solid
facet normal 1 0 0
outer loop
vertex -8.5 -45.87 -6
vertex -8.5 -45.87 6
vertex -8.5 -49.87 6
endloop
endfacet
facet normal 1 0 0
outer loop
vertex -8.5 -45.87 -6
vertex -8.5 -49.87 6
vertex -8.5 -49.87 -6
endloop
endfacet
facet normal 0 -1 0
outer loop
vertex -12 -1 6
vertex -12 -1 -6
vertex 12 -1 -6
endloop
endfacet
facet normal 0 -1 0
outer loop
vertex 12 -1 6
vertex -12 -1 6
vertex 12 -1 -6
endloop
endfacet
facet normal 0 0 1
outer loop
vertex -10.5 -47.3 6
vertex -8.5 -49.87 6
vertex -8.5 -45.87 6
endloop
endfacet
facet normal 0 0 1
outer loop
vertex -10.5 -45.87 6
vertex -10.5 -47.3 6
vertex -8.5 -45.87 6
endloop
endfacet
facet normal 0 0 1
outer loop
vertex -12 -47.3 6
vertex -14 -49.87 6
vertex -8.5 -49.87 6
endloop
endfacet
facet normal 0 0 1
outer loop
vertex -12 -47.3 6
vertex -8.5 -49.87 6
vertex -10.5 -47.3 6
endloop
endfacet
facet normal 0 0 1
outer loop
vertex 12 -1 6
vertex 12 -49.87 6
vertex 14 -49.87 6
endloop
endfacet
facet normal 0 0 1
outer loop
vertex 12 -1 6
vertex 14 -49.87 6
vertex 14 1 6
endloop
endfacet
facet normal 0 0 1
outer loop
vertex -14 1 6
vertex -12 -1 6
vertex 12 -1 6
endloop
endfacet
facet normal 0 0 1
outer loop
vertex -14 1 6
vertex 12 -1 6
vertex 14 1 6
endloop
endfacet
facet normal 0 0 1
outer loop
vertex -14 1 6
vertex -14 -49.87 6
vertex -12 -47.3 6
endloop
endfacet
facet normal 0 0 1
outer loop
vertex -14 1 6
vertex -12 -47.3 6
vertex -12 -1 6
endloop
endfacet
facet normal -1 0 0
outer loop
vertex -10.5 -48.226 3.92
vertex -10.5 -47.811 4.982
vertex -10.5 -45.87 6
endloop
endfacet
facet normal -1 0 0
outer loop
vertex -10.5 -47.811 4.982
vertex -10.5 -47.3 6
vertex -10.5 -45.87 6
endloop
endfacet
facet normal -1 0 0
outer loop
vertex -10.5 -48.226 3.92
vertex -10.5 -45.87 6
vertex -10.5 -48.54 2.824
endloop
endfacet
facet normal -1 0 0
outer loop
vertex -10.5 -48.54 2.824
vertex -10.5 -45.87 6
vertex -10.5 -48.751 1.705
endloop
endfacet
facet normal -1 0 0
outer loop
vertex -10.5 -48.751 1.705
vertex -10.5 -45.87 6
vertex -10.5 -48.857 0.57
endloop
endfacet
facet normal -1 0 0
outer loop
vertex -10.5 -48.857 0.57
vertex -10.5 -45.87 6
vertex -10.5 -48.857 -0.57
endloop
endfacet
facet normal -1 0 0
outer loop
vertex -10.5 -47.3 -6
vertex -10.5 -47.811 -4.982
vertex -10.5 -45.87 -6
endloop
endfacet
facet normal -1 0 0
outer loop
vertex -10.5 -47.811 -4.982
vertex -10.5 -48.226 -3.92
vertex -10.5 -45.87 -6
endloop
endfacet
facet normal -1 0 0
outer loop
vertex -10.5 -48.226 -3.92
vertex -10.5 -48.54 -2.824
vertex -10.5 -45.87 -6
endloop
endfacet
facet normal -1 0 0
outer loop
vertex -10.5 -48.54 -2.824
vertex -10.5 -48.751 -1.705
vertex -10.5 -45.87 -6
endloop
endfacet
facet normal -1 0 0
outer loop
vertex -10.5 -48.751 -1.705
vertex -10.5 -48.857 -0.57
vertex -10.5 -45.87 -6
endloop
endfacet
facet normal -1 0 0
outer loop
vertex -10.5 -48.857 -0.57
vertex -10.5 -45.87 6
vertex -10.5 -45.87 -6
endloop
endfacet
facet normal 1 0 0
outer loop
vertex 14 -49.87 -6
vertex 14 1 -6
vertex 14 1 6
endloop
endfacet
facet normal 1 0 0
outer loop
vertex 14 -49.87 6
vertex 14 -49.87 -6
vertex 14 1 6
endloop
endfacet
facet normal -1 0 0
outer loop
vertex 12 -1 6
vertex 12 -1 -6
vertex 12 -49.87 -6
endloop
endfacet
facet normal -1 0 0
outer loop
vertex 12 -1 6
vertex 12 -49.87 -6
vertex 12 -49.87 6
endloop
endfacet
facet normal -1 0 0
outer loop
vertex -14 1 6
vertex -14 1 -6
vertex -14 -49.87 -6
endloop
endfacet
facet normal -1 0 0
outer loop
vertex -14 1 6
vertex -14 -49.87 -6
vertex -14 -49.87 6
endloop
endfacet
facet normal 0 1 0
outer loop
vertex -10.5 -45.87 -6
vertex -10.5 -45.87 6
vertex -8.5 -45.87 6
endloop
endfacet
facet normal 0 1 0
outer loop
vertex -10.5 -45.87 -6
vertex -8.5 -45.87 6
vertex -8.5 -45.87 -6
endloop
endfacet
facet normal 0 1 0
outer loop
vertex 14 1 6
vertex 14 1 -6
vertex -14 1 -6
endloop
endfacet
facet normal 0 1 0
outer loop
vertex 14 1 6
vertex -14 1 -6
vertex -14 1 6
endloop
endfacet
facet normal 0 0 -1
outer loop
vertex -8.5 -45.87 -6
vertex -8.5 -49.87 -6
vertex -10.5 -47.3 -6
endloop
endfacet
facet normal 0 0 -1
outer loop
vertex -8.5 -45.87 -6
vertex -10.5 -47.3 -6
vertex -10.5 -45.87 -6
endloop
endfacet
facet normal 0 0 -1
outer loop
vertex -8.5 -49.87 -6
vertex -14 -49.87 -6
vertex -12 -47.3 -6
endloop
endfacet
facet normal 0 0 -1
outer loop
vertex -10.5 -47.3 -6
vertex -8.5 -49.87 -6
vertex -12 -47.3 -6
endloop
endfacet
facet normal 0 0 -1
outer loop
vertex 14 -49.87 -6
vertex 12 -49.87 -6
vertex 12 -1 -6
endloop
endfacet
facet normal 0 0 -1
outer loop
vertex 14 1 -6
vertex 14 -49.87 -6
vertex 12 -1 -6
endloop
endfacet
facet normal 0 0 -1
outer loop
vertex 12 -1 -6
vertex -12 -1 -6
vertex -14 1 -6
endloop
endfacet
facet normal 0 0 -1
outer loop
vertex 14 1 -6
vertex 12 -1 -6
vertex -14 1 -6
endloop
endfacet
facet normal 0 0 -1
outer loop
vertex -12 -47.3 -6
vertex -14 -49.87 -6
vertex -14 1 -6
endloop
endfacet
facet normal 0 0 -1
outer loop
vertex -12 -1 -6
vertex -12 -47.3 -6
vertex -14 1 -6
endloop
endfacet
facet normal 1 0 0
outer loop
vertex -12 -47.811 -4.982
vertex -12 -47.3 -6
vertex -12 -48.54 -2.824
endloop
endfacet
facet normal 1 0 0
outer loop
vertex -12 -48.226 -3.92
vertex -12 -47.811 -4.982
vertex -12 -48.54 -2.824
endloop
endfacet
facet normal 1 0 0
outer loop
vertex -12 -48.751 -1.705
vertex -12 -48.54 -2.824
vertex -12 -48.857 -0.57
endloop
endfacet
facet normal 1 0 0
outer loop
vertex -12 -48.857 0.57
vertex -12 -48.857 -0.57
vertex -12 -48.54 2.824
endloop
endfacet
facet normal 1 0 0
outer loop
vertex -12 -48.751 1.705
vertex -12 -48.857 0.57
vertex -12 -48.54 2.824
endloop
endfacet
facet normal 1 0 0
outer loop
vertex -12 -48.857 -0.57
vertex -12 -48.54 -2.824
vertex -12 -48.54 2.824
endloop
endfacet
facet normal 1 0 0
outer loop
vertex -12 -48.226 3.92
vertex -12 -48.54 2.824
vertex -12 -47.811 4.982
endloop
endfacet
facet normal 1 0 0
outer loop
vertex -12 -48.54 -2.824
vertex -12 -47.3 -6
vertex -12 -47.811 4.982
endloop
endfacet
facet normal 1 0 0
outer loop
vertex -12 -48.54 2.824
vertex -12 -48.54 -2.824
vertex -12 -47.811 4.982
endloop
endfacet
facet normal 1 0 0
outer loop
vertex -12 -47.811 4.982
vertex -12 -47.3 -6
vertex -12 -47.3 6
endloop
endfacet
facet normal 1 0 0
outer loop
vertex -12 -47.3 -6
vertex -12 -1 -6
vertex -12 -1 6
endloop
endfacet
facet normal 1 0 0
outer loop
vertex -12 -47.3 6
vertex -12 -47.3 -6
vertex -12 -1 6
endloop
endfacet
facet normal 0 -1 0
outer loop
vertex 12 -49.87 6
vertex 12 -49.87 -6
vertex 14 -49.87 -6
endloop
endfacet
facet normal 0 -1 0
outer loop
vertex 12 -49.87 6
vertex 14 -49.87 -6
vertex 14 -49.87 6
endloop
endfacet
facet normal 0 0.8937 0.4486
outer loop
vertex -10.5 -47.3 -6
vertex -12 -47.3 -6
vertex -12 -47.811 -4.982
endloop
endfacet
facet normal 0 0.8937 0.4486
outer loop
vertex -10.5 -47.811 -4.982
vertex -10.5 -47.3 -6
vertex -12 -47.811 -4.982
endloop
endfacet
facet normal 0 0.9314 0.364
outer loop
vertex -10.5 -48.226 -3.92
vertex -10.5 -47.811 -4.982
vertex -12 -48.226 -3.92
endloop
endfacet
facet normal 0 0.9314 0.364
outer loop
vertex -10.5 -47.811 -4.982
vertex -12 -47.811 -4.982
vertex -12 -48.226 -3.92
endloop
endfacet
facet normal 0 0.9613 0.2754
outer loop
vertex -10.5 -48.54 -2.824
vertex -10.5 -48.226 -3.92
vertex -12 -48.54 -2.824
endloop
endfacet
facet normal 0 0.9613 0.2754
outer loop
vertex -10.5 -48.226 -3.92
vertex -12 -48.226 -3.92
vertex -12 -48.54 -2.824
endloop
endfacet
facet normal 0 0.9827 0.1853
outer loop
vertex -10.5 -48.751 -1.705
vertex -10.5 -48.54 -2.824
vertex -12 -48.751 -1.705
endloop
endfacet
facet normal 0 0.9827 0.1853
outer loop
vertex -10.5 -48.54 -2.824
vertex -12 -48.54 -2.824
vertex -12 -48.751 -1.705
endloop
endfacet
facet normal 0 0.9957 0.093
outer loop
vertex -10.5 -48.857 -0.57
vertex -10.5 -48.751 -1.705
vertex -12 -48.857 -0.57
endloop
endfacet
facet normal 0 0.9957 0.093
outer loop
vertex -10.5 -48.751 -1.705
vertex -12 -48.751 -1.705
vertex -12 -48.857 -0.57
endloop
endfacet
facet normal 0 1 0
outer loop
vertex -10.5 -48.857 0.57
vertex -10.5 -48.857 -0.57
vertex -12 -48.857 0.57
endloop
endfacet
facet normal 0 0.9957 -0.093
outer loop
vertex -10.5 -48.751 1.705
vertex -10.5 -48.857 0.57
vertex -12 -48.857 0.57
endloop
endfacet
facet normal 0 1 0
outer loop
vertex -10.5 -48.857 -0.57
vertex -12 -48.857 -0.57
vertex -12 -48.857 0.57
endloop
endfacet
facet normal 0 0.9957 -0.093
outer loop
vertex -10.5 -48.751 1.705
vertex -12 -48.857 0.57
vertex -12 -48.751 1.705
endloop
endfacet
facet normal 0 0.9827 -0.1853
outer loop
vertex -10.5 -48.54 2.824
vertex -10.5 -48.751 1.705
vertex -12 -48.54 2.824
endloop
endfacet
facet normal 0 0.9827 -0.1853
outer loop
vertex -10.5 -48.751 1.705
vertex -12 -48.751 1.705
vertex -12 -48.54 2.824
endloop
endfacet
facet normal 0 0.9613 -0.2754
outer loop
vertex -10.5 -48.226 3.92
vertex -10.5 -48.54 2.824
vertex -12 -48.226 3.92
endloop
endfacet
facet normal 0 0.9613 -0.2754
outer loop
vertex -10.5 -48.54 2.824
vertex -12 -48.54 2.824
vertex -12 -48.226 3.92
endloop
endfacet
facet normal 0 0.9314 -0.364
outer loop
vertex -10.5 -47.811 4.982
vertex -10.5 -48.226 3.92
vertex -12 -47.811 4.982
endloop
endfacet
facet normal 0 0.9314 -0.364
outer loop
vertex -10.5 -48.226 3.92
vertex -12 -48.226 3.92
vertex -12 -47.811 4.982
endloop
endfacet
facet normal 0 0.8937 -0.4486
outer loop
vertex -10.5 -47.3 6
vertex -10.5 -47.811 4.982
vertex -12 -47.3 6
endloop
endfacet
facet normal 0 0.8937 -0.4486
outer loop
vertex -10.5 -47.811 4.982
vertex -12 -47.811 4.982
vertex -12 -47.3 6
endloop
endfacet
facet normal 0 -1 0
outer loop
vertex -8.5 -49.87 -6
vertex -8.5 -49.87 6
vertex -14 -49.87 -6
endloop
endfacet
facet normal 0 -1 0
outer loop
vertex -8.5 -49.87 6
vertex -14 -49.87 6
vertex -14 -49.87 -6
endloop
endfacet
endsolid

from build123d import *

# Parameters (mm, degrees)
SKETCH1_W           = 24
SKETCH1_H           = 12
BOSS_EXTRUDE1_DEPTH = 1
SKETCH2_W           = 12
SKETCH2_H           = 50.87
BOSS_EXTRUDE2_DEPTH = 2
BOSS_EXTRUDE3_DEPTH = 1.5
SKETCH5_W           = 12
SKETCH5_H           = 4
BOSS_EXTRUDE4_DEPTH = 2


with BuildPart() as part:
    # Sketch1 → Boss-Extrude1 (new, symmetric)
    with BuildSketch(Plane(origin=(0, 0, 0), x_dir=(1, 0, 0), z_dir=(0, 1, 0))):
        Rectangle(SKETCH1_W, SKETCH1_H)
    extrude(amount=BOSS_EXTRUDE1_DEPTH, both=True)

    # Sketch2 → Boss-Extrude2 (add)
    with BuildSketch(Plane.ZY.offset(12)):
        with Locations((0, -24.435)):
            Rectangle(SKETCH2_W, SKETCH2_H)
    boss_extrude2 = extrude(amount=BOSS_EXTRUDE2_DEPTH)

    # Mirror1: Boss-Extrude2 across plane
    add(boss_extrude2.mirror(Plane(origin=(0, 0, 0), x_dir=(0, 0, 1), z_dir=(1, 0, 0))))

    # Sketch4 → Boss-Extrude3 (add)
    with BuildSketch(Plane(origin=(-12, 0, 0), x_dir=(0, 0, -1), z_dir=(1, 0, 0))):
        with BuildLine():
            Line((-6, -47.300004682), (-6, -49.87))
            Line((-6, -49.87), (6, -49.87))
            Line((6, -49.87), (6, -47.300004682))
            ThreePointArc((6, -47.300004682), (0, -48.87), (-6, -47.300004682))
        make_face()
    extrude(amount=BOSS_EXTRUDE3_DEPTH)

    # Sketch5 → Boss-Extrude4 (add)
    with BuildSketch(Plane(origin=(-10.5, 0, 0), x_dir=(0, 0, -1), z_dir=(1, 0, 0))):
        with Locations((0, -47.87)):
            Rectangle(SKETCH5_W, SKETCH5_H)
    extrude(amount=BOSS_EXTRUDE4_DEPTH)


solid = part.part
